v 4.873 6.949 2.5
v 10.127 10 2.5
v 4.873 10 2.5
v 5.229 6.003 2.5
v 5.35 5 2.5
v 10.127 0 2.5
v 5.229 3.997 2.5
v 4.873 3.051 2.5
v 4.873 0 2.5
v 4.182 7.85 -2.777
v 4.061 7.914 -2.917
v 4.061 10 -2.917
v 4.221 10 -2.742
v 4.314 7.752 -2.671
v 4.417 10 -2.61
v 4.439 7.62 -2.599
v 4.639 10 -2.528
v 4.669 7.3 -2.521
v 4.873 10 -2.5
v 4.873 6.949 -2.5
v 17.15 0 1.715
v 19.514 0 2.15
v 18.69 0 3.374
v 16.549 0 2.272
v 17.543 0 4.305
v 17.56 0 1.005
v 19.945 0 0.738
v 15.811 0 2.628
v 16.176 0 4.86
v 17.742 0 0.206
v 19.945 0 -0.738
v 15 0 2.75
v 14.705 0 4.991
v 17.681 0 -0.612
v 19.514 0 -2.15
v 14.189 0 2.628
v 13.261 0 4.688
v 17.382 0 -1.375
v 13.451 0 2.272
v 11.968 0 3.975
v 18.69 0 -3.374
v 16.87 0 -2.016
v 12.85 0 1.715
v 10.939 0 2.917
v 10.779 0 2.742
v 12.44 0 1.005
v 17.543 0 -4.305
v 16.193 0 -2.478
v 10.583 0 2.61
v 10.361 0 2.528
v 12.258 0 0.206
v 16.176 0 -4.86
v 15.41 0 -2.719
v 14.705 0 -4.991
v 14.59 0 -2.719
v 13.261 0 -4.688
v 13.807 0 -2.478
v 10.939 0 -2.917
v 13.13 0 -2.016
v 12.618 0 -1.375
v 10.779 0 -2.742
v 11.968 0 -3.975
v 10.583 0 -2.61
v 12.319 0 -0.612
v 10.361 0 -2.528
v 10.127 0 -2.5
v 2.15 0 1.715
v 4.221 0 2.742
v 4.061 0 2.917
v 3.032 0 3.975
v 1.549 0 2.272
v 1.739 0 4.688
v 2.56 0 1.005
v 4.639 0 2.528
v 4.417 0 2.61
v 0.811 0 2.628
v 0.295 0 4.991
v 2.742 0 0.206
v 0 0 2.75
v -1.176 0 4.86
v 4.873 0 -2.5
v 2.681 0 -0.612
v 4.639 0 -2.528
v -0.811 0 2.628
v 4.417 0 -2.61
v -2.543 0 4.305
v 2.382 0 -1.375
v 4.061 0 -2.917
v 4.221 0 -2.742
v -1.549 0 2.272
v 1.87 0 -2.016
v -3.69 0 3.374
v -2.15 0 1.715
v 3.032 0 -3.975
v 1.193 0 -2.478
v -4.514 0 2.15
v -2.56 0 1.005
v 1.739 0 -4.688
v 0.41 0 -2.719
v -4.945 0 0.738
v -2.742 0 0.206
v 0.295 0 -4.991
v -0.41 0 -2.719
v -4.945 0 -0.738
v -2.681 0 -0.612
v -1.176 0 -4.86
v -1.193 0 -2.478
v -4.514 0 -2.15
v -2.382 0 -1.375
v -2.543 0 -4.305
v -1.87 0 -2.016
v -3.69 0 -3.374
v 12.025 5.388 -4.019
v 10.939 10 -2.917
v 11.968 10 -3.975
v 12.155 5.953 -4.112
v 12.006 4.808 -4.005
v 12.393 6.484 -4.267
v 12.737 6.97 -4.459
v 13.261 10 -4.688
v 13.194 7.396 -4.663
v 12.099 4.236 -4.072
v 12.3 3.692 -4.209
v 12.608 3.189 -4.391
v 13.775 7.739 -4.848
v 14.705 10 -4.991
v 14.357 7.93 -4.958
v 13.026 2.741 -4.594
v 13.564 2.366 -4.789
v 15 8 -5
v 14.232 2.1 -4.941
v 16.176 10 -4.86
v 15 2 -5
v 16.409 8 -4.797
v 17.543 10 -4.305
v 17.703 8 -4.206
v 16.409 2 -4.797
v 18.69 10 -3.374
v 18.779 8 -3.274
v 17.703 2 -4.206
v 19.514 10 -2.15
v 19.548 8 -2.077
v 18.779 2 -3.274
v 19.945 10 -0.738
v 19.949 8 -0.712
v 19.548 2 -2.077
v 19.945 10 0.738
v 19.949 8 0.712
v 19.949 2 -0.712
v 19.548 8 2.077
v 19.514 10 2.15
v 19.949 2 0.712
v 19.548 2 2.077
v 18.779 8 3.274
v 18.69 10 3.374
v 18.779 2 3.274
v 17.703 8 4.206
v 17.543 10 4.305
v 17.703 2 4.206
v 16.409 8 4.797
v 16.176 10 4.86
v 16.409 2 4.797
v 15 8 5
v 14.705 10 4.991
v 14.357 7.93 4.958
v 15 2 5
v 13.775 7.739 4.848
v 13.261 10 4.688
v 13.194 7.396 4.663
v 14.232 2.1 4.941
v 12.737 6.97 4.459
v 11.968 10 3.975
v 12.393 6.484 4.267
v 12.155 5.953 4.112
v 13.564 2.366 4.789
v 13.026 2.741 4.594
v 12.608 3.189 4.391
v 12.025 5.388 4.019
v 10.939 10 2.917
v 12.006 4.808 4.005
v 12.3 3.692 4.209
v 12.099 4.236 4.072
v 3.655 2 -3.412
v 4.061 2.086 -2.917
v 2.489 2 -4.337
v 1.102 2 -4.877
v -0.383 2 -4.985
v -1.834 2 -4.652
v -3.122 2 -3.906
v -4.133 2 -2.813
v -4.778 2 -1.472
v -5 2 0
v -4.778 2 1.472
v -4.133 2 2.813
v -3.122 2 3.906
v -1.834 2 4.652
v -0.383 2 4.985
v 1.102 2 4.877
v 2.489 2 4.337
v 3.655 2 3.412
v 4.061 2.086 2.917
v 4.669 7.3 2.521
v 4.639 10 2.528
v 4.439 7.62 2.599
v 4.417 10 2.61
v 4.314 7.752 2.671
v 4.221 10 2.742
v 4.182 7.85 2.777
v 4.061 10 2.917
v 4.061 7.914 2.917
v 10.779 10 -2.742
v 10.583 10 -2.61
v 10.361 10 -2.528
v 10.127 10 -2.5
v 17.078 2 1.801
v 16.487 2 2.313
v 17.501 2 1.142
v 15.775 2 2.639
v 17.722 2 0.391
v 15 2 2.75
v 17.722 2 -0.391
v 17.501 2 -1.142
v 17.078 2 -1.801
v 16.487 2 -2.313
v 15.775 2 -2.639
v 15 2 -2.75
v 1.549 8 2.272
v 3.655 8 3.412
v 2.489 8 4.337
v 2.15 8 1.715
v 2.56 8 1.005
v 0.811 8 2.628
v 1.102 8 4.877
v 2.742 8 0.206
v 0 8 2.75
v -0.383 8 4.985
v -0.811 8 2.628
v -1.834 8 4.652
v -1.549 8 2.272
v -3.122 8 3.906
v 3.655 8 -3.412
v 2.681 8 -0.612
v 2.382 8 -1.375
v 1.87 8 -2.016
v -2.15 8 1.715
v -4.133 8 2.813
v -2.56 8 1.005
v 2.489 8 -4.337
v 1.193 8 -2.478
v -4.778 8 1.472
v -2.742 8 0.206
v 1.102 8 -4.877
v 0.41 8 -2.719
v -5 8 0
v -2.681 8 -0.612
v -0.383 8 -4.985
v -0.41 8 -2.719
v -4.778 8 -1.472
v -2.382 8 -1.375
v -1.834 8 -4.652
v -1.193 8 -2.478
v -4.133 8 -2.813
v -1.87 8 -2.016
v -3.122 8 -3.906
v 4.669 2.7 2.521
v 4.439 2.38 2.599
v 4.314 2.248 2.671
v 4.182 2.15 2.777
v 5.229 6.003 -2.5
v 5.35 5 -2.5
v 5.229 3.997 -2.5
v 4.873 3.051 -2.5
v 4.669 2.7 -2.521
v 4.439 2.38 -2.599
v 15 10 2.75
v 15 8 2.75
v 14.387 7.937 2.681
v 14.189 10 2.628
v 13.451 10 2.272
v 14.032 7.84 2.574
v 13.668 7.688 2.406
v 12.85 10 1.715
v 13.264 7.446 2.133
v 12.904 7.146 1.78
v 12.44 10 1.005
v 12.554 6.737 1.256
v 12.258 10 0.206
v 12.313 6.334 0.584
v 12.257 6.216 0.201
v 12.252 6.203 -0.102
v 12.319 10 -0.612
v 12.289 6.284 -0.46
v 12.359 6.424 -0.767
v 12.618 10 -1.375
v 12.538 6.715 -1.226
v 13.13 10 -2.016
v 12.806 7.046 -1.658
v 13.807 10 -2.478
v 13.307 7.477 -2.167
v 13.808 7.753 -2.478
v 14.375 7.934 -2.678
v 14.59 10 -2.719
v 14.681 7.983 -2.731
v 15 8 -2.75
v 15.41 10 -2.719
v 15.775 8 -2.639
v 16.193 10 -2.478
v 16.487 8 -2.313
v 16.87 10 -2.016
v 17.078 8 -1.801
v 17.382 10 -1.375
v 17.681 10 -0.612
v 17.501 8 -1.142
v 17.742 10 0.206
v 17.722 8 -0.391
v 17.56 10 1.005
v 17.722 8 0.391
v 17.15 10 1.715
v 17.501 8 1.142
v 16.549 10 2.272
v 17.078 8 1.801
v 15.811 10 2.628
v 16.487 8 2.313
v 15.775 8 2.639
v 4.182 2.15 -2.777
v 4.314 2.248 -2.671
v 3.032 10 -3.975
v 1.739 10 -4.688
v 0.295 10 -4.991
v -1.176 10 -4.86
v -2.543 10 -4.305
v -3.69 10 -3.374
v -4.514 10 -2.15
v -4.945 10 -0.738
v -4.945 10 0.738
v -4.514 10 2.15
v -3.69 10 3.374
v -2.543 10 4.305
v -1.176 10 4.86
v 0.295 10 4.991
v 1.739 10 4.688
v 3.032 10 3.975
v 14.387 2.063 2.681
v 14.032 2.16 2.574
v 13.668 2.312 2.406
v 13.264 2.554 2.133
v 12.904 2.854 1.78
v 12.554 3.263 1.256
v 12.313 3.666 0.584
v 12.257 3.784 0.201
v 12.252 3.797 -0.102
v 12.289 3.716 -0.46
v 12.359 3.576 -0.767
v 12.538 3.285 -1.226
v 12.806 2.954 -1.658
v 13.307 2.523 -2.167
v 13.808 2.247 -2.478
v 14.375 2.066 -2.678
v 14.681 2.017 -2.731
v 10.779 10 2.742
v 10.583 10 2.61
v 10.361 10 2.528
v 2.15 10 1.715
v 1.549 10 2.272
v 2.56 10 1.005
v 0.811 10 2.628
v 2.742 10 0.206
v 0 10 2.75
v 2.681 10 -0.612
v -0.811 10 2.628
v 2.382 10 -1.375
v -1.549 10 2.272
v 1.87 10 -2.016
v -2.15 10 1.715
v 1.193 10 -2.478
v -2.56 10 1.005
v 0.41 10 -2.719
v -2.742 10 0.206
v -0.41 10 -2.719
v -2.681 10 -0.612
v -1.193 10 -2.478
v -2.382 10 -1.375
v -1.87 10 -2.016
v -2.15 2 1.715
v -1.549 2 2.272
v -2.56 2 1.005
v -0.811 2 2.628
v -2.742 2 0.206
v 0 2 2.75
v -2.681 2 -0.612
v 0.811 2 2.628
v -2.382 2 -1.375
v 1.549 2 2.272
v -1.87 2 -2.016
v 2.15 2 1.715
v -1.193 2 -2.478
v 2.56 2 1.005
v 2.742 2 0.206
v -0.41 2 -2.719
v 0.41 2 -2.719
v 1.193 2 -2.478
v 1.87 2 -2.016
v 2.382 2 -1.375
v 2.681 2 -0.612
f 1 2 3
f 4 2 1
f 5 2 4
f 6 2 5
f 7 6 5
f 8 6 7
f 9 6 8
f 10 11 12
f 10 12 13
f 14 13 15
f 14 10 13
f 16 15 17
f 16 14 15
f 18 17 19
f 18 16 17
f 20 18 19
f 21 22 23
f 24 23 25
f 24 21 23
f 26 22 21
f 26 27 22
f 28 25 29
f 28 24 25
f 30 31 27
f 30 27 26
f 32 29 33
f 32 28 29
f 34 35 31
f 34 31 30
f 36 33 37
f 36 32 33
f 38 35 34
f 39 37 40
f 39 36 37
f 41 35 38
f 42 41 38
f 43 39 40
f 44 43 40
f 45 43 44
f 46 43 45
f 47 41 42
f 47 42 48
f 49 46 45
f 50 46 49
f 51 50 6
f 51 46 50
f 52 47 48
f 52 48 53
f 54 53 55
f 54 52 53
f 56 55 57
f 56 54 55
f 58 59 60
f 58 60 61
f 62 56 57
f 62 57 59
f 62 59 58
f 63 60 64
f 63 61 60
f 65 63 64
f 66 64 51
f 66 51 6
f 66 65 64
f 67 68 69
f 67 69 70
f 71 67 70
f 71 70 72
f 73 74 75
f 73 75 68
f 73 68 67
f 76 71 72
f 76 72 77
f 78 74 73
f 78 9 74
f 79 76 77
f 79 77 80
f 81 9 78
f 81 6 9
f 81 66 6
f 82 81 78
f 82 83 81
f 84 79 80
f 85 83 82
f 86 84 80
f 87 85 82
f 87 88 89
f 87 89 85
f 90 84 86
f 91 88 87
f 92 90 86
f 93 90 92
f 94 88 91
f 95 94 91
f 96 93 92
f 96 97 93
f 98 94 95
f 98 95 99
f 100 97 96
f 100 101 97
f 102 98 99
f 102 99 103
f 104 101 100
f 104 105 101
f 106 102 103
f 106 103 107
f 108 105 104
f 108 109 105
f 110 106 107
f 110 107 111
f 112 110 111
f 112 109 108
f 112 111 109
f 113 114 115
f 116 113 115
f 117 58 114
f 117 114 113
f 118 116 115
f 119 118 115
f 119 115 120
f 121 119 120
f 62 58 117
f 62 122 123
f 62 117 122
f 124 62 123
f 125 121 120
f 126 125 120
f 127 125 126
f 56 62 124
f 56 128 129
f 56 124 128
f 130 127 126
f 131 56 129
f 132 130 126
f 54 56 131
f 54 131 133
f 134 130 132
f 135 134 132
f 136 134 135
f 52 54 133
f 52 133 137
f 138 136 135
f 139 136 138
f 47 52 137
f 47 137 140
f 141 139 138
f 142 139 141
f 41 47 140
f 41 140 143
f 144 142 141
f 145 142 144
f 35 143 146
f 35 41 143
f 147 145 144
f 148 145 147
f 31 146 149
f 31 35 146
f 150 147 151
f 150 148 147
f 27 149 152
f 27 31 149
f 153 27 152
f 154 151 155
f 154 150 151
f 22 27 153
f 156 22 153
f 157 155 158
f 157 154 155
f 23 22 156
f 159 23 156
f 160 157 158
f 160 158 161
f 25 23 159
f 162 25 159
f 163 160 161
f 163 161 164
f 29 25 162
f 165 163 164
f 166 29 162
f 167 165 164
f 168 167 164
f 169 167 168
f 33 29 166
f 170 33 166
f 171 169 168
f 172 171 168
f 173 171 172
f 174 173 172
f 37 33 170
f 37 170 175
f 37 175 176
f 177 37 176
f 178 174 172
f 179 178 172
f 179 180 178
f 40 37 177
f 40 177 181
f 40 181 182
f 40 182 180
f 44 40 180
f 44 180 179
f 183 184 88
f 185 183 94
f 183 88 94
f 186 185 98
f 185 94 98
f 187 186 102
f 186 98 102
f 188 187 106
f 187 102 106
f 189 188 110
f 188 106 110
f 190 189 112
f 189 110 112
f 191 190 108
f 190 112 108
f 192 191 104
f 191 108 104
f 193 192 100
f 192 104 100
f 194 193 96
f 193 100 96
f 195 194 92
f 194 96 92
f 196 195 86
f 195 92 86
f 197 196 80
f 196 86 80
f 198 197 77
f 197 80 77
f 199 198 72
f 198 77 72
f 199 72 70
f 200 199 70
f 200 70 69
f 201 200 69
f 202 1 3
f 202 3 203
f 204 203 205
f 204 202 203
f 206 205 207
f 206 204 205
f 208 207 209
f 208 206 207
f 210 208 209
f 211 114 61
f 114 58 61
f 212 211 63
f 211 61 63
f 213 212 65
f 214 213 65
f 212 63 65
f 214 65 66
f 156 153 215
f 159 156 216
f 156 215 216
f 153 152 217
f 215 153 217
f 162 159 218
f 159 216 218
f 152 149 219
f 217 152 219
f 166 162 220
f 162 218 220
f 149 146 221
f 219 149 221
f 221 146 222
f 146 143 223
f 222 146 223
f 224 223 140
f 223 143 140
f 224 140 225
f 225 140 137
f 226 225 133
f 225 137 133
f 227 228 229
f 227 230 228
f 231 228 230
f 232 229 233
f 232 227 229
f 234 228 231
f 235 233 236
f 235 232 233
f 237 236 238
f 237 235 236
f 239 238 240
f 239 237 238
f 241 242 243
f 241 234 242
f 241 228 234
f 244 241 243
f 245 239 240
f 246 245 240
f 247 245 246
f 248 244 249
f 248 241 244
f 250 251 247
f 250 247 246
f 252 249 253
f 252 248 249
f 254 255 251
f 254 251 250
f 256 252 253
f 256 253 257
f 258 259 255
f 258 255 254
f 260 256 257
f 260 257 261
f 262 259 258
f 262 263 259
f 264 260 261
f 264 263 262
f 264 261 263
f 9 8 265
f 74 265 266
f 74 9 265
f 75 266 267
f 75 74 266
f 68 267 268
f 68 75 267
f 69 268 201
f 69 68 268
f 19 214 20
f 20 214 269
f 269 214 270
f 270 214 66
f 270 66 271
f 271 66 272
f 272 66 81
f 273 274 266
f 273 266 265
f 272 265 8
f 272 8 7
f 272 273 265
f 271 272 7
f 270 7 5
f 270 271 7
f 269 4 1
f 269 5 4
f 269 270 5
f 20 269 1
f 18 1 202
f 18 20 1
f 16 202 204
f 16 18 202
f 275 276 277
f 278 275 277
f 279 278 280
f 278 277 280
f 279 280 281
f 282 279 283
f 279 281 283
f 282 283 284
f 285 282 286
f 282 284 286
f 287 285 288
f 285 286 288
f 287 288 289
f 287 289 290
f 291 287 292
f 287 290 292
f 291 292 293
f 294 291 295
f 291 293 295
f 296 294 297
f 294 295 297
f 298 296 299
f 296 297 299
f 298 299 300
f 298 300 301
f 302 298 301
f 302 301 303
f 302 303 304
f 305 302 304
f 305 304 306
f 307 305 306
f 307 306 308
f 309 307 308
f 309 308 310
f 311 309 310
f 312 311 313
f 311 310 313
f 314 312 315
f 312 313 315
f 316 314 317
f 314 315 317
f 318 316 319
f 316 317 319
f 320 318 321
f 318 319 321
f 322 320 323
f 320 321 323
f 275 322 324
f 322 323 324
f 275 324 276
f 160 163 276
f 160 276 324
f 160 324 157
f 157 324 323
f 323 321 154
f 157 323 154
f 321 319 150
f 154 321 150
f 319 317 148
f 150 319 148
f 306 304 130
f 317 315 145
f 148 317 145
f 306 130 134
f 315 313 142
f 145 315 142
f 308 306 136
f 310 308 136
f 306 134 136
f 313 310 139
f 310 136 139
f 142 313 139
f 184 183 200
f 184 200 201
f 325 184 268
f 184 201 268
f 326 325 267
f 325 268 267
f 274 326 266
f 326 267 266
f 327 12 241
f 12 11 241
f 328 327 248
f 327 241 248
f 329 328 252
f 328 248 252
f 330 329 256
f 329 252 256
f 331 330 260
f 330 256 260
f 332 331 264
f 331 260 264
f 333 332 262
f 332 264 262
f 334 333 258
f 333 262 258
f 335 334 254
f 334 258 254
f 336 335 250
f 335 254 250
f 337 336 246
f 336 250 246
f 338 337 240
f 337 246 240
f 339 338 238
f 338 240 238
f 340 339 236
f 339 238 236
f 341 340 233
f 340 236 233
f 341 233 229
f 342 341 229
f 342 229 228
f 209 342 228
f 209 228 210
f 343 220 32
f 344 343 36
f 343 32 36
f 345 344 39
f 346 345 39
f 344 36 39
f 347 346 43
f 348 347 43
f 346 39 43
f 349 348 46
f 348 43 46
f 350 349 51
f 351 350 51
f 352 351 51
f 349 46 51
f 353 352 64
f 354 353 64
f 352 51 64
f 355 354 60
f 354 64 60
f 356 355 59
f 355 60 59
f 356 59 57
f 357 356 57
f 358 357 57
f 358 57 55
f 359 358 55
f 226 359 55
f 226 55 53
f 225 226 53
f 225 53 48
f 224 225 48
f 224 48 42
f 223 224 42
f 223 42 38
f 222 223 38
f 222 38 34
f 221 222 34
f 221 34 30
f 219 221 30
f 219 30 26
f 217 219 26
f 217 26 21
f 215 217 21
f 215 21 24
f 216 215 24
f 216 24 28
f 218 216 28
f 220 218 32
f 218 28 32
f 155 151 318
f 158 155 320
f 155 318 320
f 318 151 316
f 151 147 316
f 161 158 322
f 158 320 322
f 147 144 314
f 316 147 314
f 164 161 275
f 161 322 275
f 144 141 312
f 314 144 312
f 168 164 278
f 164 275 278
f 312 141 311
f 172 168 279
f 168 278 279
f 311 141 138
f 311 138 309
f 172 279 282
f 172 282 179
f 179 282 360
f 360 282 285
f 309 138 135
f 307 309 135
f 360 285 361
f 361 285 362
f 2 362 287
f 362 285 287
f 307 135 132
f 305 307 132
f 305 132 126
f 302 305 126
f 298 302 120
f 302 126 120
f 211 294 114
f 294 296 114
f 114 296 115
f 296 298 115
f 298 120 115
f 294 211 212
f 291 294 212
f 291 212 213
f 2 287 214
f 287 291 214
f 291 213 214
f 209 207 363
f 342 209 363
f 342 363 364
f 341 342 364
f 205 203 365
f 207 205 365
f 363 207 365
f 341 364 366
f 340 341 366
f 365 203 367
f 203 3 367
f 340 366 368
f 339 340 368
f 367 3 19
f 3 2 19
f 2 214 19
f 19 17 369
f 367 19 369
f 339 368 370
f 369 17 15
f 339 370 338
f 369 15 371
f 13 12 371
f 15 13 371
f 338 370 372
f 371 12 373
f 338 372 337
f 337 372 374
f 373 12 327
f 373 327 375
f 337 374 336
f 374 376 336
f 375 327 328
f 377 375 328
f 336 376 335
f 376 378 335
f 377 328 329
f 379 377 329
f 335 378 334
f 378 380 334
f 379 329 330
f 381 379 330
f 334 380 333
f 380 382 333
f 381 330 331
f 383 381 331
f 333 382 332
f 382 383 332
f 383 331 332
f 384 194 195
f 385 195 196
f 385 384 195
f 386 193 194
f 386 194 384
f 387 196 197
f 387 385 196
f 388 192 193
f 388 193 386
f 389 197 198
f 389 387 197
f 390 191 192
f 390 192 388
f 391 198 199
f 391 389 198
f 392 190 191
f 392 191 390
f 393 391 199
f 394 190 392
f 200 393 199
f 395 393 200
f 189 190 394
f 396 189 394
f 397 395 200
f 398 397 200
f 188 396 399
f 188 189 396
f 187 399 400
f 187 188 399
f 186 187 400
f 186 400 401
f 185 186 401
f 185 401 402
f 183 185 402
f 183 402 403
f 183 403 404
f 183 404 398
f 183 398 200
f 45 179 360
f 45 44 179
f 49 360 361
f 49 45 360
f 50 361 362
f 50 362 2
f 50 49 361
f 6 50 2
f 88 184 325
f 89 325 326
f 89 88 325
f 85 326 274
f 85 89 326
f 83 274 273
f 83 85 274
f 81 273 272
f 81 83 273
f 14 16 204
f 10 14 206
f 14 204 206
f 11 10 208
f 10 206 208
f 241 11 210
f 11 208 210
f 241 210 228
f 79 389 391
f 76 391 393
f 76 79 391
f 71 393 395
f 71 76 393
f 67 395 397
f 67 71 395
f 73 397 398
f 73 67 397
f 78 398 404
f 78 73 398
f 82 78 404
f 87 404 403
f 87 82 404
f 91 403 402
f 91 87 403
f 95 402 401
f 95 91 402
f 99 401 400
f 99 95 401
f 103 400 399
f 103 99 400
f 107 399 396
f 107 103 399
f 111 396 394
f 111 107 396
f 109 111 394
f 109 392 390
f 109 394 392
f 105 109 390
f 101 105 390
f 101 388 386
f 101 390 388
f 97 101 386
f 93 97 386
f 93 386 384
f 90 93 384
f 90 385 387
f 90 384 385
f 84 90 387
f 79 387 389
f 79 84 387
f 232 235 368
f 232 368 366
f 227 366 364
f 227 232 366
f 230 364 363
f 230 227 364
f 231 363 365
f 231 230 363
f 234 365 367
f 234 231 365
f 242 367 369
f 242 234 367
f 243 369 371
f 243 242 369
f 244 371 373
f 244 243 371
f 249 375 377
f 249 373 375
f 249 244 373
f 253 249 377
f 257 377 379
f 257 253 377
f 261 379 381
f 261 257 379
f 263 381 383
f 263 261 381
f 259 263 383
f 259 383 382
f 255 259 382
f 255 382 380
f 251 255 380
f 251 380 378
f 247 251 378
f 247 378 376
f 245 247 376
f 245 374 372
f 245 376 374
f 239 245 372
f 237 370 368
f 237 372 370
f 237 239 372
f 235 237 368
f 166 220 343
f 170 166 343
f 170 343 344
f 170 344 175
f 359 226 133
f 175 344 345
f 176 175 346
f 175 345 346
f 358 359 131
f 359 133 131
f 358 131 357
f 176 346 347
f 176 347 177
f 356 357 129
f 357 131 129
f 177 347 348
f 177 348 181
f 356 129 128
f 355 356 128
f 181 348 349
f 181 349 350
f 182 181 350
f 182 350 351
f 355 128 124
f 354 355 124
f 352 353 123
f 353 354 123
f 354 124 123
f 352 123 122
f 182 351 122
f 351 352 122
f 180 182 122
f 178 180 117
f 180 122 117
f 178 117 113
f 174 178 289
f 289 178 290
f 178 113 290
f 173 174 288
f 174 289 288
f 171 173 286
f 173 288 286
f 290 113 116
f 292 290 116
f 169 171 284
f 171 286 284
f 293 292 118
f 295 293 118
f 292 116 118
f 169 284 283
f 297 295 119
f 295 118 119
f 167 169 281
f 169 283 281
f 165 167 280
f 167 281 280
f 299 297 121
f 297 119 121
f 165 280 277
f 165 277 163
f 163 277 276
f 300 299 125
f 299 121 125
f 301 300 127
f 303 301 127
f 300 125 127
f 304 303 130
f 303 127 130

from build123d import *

# Parameters (mm, degrees)
SKETCH1_W               = 7.5
SKETCH1_H               = 5
BOSS_EXTRUDE1_DEPTH     = 10
SKETCH2_R               = 5
BOSS_EXTRUDE2_DEPTH     = 10
CUT_EXTRUDE1_REACH      = 15.463
SKETCH3_R               = 2.75
CUT_EXTRUDE2_DEPTH      = 14.462912018
CUT_EXTRUDE2_DEPTH_BACK = 14.462912018
FILLET1_R               = 1
FILLET3_R               = 1
FILLET4_R               = 1
FILLET1_OF_MIRROR1_R    = 1
CUT_EXTRUDE3_DEPTH      = 23.91287854
CUT_EXTRUDE3_DEPTH_BACK = 23.91287854


with BuildPart() as part:
    # Sketch1 → Boss-Extrude1 (new body)
    with BuildSketch(Plane(origin=(0, 0, 0), x_dir=(1, 0, 0), z_dir=(0, 1, 0))):
        with Locations((3.75, 0)):
            Rectangle(SKETCH1_W, SKETCH1_H)
    boss_extrude1 = extrude(amount=BOSS_EXTRUDE1_DEPTH)

    # Sketch2 → Boss-Extrude2 (add)
    with BuildSketch(Plane(origin=(0, 0, 0), x_dir=(1, 0, 0), z_dir=(0, 1, 0))):
        Circle(SKETCH2_R)
    boss_extrude2 = extrude(amount=BOSS_EXTRUDE2_DEPTH)

    # Sketch3 → Cut-Extrude1 (cut, up to next)
    with BuildSketch(Plane(origin=(0, 0, 0), x_dir=(1, 0, 0), z_dir=(0, 1, 0)), mode=Mode.PRIVATE) as cut_extrude1_sk1:
        with Locations(Location((0, 0, 0), (0, 0, 270))):
            Circle(SKETCH3_R)
    cut_extrude1_tool1 = extrude(cut_extrude1_sk1.sketch, amount=CUT_EXTRUDE1_REACH, mode=Mode.PRIVATE) & part.part
    cut_extrude1 = cut_extrude1_tool1.solids().sort_by_distance((0, 0, 0))[0]
    add(cut_extrude1, mode=Mode.SUBTRACT)

    # Sketch4 → Cut-Extrude2 (cut, two sides: drawn at the far end of the back side and taken through both)
    with BuildSketch(Plane.XY.offset(-CUT_EXTRUDE2_DEPTH_BACK)):
        with BuildLine():
            Line((0, 8), (-5, 8))
            Line((-5, 8), (-5, 2))
            Line((-5, 2), (0, 2))
            Line((0, 2), (4.1, 2))
            ThreePointArc((4.1, 2), (5.35, 5), (4.1, 8))
            Line((4.1, 8), (0, 8))
        make_face()
    extrude(amount=CUT_EXTRUDE2_DEPTH + CUT_EXTRUDE2_DEPTH_BACK, mode=Mode.SUBTRACT)

    # Fillet1
    fillet1_edges = [part.edges().sort_by_distance(p)[0] for p in [
        (4.330127019, 8.876388916, -2.5),
        (4.330127019, 1.123611084, 2.5),
    ]]
    fillet(fillet1_edges, radius=FILLET1_R)

    # Fillet3
    fillet3_edges = [part.edges().sort_by_distance(p)[0] for p in [
        (4.1, 2, 0.002130312),
        (4.1, 8, -0.002130312),
    ]]
    fillet(fillet3_edges, radius=FILLET3_R)

    # Fillet4
    fillet4_edges = [part.edges().sort_by_distance(p)[0] for p in [
        (4.330127019, 1.131174119, -2.5),
        (4.330127019, 8.868825881, 2.5),
    ]]
    fillet(fillet4_edges, radius=FILLET4_R)

    # Mirror1: Boss-Extrude1, Boss-Extrude2, Cut-Extrude1 across plane
    add(boss_extrude1.mirror(Plane(origin=(7.5, 10, -2.5), x_dir=(0, 0, 1), z_dir=(-1, 0, 0))))
    add(boss_extrude2.mirror(Plane(origin=(7.5, 10, -2.5), x_dir=(0, 0, 1), z_dir=(-1, 0, 0))))
    add(cut_extrude1.mirror(Plane(origin=(7.5, 10, -2.5), x_dir=(0, 0, 1), z_dir=(-1, 0, 0))), mode=Mode.SUBTRACT)

    # Fillet1 of Mirror1
    fillet1_of_mirror1_edges = [part.edges().sort_by_distance(p)[0] for p in [
        (10.669872981, 8.876388916, -2.5),
        (10.669872981, 1.123611084, 2.5),
    ]]
    fillet(fillet1_of_mirror1_edges, radius=FILLET1_OF_MIRROR1_R)

    # Sketch6 → Cut-Extrude3 (cut, two sides: drawn at the far end of the back side and taken through both)
    with BuildSketch(Plane.XY.offset(-CUT_EXTRUDE3_DEPTH_BACK)):
        with BuildLine():
            Line((15, 8), (20, 8))
            Line((20, 8), (20, 2))
            Line((20, 2), (15, 2))
            ThreePointArc((15, 2), (12, 5), (15, 8))
        make_face()
    extrude(amount=CUT_EXTRUDE3_DEPTH + CUT_EXTRUDE3_DEPTH_BACK, mode=Mode.SUBTRACT)


solid = part.part
